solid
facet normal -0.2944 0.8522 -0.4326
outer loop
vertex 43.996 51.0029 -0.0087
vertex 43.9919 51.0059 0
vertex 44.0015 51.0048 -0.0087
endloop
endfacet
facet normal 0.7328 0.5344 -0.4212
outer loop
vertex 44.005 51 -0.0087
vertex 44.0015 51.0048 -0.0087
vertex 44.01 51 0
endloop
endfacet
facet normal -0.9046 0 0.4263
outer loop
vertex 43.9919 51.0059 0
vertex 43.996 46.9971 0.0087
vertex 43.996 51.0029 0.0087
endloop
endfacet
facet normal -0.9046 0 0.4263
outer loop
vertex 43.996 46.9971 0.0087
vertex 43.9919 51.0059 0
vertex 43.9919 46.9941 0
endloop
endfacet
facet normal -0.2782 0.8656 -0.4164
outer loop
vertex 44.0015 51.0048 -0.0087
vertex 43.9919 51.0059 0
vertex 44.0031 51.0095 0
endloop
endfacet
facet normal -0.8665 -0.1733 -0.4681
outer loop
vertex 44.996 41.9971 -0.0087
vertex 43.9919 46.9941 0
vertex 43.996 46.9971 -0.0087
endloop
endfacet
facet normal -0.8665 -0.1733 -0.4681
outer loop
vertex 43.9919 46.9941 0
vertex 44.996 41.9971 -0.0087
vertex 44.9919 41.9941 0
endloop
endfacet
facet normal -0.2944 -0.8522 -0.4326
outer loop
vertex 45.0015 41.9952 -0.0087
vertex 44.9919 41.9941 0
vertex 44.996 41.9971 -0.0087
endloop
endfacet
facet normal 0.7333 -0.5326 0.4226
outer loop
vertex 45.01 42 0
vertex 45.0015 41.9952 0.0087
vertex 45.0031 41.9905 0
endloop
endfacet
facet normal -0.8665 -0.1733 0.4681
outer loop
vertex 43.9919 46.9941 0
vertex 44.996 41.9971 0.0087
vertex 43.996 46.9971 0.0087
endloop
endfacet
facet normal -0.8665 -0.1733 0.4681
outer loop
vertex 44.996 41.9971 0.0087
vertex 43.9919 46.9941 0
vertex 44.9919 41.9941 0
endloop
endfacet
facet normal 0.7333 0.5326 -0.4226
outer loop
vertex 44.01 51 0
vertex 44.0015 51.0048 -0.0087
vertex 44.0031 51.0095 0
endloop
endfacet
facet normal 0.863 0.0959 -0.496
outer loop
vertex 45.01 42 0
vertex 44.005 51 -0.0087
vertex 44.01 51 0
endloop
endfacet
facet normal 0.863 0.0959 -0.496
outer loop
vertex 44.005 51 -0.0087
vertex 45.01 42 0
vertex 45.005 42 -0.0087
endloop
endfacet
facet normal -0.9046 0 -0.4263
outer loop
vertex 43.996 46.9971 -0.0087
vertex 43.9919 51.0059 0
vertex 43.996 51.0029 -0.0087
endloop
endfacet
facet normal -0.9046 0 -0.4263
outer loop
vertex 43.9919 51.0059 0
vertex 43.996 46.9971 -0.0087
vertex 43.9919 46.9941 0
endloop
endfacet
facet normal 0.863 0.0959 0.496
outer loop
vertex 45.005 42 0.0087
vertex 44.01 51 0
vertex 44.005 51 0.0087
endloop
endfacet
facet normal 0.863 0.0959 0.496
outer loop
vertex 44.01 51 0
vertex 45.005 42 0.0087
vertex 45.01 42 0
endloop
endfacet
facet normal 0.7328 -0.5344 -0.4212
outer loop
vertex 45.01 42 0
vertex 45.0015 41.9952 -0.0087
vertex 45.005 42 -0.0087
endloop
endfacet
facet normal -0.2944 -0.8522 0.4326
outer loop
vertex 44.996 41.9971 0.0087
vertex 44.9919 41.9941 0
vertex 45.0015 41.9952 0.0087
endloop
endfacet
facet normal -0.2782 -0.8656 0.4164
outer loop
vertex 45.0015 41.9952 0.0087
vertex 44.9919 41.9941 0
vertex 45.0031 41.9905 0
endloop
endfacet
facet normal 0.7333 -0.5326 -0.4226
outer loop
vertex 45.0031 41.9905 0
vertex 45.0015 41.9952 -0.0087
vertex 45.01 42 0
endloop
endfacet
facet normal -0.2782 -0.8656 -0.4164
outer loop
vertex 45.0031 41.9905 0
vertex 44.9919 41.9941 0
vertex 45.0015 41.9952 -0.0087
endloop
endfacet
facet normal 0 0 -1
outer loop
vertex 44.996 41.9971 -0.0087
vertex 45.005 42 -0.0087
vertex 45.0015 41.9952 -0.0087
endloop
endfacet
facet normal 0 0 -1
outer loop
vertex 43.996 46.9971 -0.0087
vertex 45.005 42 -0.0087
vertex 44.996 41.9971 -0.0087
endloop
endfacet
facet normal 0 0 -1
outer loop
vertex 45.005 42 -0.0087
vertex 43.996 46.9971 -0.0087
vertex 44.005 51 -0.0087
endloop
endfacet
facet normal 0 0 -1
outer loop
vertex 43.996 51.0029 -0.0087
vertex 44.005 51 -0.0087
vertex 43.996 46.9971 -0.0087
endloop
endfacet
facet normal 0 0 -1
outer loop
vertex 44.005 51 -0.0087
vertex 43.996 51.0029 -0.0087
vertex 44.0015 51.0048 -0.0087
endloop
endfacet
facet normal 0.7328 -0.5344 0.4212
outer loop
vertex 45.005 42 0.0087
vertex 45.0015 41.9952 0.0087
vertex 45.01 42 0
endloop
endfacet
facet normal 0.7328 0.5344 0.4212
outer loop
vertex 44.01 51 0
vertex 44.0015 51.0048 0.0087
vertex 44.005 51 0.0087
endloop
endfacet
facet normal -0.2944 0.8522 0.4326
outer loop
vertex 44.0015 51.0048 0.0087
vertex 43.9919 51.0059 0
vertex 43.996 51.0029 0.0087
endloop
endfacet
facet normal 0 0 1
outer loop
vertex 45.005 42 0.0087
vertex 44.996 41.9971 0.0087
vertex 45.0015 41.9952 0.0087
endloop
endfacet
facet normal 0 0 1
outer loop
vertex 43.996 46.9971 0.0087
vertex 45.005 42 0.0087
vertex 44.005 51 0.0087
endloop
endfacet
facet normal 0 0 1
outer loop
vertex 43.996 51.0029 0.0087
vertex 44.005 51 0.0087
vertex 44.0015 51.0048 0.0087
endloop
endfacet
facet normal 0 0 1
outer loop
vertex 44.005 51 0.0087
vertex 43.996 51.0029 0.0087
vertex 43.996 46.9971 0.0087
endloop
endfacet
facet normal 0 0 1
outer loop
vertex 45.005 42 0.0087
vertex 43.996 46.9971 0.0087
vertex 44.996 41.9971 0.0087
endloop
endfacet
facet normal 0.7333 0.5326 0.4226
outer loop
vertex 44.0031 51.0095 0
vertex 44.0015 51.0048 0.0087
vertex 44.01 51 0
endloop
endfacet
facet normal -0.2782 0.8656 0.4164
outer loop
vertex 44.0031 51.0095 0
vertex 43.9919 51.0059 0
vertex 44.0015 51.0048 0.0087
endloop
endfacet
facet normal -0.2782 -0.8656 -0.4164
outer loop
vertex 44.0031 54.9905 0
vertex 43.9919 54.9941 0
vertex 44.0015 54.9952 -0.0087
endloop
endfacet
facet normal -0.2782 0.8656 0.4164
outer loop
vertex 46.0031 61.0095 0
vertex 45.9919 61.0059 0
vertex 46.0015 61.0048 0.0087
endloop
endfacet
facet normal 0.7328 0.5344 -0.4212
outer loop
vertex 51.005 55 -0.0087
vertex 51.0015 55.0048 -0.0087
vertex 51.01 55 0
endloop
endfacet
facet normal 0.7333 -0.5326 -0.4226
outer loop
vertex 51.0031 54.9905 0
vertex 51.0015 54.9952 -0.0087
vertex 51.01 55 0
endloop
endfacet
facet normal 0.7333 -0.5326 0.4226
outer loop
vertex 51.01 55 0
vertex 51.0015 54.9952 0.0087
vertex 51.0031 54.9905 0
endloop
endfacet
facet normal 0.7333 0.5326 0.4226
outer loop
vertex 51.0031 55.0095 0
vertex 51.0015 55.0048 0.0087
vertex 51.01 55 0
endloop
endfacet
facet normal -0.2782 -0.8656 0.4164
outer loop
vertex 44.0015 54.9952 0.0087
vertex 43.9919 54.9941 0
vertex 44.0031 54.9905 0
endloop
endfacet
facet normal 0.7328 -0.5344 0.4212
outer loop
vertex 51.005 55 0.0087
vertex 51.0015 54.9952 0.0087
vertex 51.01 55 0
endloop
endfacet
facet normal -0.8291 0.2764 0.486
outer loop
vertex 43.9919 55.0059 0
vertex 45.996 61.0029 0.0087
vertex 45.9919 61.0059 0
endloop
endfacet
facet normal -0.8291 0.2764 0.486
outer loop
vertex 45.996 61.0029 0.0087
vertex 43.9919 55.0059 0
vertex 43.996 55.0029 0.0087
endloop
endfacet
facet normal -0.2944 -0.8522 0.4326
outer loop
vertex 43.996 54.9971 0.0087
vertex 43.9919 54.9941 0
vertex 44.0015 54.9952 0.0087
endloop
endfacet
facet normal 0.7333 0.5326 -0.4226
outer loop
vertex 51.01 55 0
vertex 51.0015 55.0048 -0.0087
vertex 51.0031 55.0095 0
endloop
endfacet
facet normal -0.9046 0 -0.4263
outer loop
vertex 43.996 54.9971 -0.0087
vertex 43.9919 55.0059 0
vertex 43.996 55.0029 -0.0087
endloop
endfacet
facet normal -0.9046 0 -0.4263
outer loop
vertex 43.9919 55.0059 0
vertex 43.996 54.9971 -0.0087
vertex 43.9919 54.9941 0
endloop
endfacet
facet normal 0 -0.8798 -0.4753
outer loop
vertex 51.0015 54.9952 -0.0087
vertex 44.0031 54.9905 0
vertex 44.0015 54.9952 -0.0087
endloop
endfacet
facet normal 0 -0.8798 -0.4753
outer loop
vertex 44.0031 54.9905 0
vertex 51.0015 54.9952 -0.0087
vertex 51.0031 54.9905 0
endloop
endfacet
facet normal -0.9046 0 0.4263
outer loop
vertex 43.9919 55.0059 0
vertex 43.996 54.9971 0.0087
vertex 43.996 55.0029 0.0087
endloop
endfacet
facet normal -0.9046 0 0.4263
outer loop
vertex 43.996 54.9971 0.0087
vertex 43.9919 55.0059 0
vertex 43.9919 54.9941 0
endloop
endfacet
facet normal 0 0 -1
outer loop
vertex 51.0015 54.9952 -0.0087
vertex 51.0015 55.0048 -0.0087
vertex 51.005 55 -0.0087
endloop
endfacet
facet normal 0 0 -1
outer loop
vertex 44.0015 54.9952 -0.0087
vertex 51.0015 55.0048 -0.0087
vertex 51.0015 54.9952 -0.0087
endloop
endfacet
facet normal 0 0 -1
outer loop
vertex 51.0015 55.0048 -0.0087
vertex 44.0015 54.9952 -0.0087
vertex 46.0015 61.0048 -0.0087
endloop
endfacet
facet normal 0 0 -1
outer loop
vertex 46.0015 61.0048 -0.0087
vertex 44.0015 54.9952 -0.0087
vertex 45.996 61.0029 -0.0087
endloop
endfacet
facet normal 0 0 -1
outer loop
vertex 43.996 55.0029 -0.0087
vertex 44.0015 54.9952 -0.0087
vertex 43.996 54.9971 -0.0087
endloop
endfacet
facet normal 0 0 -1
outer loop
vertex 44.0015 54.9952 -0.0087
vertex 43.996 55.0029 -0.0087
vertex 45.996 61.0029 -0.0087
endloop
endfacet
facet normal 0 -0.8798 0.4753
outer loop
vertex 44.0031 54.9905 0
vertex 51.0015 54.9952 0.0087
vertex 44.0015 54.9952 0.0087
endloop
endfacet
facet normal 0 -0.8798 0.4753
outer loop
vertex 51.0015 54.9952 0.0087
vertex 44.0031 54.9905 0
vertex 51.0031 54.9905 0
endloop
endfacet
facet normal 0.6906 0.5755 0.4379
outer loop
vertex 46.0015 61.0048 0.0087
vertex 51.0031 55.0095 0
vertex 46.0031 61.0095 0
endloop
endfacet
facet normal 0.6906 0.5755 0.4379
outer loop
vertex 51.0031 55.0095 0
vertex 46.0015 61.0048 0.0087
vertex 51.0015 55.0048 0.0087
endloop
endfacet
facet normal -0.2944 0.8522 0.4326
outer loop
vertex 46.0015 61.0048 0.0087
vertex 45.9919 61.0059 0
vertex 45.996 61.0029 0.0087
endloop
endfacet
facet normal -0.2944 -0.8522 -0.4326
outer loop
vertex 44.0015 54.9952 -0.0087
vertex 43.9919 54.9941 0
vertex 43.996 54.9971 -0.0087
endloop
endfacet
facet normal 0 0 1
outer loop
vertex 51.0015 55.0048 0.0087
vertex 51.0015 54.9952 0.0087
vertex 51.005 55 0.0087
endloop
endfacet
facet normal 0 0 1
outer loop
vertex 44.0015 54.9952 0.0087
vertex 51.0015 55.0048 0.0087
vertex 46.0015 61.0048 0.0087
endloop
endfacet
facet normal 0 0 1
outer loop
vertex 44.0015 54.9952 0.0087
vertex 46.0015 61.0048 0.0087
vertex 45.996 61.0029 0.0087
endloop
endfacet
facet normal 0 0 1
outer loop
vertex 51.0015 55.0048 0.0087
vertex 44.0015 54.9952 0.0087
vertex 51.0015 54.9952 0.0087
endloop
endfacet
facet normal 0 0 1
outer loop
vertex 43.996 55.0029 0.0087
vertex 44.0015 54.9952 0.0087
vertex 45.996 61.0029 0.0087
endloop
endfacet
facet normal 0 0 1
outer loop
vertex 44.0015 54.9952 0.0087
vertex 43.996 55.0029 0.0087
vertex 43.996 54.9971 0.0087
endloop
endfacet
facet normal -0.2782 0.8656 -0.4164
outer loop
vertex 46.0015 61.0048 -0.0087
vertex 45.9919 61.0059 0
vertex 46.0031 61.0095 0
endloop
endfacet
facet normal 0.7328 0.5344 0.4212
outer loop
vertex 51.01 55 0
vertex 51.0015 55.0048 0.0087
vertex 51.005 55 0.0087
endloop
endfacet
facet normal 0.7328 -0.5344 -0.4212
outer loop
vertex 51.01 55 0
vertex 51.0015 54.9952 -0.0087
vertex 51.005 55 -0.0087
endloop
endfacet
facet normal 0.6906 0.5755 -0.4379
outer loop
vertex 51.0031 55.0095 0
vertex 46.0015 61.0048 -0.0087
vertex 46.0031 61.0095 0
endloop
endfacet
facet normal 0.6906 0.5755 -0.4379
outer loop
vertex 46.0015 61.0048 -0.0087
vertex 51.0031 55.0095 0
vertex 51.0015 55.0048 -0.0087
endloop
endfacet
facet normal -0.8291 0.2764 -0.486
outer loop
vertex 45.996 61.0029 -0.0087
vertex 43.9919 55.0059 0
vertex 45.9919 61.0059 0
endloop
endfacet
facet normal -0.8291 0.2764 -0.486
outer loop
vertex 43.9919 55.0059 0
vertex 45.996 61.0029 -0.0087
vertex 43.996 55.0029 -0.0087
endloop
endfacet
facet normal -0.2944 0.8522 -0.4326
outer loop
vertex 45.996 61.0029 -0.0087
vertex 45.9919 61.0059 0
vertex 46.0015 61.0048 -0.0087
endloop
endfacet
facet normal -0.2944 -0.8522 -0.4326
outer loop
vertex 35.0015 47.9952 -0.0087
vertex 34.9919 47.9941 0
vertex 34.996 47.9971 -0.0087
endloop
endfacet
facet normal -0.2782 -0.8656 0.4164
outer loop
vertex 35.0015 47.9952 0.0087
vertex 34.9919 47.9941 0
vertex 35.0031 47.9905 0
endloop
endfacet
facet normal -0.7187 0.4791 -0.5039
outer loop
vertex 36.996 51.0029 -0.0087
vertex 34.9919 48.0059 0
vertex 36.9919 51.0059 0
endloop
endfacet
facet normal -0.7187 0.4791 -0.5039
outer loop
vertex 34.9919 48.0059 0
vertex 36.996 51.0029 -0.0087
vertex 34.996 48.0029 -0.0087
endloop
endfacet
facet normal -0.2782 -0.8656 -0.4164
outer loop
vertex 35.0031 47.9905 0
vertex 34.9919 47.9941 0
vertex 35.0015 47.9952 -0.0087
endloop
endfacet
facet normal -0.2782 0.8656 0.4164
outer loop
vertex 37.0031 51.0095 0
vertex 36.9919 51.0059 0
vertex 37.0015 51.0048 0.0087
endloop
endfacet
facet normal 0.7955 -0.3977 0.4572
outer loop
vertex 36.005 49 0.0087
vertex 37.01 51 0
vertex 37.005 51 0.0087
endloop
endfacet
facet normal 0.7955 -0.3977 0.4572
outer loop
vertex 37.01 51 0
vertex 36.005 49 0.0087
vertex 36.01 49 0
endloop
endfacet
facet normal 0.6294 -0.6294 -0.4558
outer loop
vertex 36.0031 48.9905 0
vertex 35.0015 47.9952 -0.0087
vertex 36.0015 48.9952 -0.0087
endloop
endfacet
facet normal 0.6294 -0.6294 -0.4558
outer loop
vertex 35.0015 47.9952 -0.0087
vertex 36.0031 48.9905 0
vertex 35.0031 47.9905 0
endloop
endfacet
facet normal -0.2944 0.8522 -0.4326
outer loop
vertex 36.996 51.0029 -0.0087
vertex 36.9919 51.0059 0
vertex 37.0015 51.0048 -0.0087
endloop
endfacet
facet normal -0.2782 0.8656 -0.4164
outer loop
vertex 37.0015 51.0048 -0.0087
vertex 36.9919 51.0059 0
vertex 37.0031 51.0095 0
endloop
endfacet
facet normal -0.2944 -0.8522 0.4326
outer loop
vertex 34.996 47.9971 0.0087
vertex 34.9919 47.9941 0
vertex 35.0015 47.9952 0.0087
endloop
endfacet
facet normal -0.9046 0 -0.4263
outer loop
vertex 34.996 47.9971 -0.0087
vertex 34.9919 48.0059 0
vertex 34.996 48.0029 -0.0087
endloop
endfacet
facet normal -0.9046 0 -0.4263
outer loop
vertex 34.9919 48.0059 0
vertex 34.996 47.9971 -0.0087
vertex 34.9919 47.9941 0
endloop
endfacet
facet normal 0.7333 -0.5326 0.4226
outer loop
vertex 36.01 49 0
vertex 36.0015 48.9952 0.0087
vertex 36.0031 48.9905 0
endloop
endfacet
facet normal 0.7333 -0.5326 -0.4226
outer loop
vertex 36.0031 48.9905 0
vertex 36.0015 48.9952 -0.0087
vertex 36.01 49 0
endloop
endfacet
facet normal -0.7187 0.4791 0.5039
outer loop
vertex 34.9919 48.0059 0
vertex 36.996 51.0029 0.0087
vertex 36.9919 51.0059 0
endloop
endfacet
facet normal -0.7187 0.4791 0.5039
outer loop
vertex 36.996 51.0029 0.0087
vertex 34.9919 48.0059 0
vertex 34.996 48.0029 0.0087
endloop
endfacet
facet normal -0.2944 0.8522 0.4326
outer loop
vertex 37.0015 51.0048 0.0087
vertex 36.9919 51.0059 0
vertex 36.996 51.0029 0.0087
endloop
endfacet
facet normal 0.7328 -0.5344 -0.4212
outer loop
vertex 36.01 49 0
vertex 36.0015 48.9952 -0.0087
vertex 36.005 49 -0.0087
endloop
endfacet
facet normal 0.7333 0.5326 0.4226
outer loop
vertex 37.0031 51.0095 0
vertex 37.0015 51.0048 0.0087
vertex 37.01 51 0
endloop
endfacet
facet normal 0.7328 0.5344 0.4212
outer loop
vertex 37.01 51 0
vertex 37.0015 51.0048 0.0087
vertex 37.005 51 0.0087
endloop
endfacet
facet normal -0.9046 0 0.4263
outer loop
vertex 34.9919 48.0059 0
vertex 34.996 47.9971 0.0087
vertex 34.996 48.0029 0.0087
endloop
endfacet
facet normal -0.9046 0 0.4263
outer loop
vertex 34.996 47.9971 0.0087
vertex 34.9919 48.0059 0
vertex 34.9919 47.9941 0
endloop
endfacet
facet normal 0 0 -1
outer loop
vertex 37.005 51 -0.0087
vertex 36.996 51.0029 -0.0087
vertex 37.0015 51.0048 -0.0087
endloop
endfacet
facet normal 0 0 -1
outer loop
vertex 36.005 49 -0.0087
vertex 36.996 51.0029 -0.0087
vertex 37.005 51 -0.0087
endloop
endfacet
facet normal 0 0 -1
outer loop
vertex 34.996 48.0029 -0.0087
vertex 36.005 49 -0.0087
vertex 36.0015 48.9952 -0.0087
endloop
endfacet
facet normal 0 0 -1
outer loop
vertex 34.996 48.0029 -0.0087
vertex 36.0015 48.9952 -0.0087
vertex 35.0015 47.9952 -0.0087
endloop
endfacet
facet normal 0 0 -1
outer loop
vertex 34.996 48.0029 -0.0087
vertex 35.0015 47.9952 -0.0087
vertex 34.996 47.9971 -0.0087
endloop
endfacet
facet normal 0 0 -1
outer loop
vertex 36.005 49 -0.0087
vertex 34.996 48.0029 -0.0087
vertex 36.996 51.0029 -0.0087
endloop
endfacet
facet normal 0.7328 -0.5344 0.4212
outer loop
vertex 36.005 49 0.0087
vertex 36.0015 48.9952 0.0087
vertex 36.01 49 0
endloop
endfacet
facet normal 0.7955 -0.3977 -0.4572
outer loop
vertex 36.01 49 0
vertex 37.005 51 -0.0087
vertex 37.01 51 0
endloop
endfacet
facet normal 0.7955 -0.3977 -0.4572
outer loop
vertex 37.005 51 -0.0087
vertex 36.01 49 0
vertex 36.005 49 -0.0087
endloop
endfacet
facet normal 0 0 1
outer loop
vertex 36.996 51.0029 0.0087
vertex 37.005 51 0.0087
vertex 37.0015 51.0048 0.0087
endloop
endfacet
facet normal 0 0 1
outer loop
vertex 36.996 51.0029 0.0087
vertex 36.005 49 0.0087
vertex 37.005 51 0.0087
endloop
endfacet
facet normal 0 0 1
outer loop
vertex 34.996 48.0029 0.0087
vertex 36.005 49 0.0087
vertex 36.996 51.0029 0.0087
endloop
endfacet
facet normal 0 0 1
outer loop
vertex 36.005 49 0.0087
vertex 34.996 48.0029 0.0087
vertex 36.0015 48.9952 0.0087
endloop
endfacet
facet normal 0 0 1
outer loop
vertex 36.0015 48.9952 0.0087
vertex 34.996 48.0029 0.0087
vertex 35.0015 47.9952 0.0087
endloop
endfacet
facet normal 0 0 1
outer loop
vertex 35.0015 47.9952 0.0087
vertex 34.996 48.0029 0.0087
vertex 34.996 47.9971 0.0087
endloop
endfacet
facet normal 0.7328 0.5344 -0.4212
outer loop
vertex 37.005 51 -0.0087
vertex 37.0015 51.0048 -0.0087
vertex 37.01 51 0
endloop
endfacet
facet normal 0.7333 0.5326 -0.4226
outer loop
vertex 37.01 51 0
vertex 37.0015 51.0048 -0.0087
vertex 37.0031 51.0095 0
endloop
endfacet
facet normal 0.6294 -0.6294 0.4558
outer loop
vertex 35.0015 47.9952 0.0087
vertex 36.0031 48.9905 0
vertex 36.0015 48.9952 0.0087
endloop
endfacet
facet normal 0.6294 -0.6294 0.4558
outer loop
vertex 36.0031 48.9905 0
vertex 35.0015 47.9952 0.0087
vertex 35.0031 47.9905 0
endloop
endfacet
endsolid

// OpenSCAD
color([0.6368036454816876,0.4396073138404065,0.21313533217243863]) hull(){
    translate([44,47]) sphere(0.01);
    translate([44,51]) sphere(0.01);
    translate([45,42]) sphere(0.01);
}
color([0.65487357625566,0.5195911243495295,0.9295357628477254]) hull(){
    translate([46,61]) sphere(0.01);
    translate([44,55]) sphere(0.01);
    translate([51,55]) sphere(0.01);
}
color([0.5484054396345015,0.1795491616181364,0.36277019899079666]) hull(){
    translate([35,48]) sphere(0.01);
    translate([36,49]) sphere(0.01);
    translate([37,51]) sphere(0.01);
}
